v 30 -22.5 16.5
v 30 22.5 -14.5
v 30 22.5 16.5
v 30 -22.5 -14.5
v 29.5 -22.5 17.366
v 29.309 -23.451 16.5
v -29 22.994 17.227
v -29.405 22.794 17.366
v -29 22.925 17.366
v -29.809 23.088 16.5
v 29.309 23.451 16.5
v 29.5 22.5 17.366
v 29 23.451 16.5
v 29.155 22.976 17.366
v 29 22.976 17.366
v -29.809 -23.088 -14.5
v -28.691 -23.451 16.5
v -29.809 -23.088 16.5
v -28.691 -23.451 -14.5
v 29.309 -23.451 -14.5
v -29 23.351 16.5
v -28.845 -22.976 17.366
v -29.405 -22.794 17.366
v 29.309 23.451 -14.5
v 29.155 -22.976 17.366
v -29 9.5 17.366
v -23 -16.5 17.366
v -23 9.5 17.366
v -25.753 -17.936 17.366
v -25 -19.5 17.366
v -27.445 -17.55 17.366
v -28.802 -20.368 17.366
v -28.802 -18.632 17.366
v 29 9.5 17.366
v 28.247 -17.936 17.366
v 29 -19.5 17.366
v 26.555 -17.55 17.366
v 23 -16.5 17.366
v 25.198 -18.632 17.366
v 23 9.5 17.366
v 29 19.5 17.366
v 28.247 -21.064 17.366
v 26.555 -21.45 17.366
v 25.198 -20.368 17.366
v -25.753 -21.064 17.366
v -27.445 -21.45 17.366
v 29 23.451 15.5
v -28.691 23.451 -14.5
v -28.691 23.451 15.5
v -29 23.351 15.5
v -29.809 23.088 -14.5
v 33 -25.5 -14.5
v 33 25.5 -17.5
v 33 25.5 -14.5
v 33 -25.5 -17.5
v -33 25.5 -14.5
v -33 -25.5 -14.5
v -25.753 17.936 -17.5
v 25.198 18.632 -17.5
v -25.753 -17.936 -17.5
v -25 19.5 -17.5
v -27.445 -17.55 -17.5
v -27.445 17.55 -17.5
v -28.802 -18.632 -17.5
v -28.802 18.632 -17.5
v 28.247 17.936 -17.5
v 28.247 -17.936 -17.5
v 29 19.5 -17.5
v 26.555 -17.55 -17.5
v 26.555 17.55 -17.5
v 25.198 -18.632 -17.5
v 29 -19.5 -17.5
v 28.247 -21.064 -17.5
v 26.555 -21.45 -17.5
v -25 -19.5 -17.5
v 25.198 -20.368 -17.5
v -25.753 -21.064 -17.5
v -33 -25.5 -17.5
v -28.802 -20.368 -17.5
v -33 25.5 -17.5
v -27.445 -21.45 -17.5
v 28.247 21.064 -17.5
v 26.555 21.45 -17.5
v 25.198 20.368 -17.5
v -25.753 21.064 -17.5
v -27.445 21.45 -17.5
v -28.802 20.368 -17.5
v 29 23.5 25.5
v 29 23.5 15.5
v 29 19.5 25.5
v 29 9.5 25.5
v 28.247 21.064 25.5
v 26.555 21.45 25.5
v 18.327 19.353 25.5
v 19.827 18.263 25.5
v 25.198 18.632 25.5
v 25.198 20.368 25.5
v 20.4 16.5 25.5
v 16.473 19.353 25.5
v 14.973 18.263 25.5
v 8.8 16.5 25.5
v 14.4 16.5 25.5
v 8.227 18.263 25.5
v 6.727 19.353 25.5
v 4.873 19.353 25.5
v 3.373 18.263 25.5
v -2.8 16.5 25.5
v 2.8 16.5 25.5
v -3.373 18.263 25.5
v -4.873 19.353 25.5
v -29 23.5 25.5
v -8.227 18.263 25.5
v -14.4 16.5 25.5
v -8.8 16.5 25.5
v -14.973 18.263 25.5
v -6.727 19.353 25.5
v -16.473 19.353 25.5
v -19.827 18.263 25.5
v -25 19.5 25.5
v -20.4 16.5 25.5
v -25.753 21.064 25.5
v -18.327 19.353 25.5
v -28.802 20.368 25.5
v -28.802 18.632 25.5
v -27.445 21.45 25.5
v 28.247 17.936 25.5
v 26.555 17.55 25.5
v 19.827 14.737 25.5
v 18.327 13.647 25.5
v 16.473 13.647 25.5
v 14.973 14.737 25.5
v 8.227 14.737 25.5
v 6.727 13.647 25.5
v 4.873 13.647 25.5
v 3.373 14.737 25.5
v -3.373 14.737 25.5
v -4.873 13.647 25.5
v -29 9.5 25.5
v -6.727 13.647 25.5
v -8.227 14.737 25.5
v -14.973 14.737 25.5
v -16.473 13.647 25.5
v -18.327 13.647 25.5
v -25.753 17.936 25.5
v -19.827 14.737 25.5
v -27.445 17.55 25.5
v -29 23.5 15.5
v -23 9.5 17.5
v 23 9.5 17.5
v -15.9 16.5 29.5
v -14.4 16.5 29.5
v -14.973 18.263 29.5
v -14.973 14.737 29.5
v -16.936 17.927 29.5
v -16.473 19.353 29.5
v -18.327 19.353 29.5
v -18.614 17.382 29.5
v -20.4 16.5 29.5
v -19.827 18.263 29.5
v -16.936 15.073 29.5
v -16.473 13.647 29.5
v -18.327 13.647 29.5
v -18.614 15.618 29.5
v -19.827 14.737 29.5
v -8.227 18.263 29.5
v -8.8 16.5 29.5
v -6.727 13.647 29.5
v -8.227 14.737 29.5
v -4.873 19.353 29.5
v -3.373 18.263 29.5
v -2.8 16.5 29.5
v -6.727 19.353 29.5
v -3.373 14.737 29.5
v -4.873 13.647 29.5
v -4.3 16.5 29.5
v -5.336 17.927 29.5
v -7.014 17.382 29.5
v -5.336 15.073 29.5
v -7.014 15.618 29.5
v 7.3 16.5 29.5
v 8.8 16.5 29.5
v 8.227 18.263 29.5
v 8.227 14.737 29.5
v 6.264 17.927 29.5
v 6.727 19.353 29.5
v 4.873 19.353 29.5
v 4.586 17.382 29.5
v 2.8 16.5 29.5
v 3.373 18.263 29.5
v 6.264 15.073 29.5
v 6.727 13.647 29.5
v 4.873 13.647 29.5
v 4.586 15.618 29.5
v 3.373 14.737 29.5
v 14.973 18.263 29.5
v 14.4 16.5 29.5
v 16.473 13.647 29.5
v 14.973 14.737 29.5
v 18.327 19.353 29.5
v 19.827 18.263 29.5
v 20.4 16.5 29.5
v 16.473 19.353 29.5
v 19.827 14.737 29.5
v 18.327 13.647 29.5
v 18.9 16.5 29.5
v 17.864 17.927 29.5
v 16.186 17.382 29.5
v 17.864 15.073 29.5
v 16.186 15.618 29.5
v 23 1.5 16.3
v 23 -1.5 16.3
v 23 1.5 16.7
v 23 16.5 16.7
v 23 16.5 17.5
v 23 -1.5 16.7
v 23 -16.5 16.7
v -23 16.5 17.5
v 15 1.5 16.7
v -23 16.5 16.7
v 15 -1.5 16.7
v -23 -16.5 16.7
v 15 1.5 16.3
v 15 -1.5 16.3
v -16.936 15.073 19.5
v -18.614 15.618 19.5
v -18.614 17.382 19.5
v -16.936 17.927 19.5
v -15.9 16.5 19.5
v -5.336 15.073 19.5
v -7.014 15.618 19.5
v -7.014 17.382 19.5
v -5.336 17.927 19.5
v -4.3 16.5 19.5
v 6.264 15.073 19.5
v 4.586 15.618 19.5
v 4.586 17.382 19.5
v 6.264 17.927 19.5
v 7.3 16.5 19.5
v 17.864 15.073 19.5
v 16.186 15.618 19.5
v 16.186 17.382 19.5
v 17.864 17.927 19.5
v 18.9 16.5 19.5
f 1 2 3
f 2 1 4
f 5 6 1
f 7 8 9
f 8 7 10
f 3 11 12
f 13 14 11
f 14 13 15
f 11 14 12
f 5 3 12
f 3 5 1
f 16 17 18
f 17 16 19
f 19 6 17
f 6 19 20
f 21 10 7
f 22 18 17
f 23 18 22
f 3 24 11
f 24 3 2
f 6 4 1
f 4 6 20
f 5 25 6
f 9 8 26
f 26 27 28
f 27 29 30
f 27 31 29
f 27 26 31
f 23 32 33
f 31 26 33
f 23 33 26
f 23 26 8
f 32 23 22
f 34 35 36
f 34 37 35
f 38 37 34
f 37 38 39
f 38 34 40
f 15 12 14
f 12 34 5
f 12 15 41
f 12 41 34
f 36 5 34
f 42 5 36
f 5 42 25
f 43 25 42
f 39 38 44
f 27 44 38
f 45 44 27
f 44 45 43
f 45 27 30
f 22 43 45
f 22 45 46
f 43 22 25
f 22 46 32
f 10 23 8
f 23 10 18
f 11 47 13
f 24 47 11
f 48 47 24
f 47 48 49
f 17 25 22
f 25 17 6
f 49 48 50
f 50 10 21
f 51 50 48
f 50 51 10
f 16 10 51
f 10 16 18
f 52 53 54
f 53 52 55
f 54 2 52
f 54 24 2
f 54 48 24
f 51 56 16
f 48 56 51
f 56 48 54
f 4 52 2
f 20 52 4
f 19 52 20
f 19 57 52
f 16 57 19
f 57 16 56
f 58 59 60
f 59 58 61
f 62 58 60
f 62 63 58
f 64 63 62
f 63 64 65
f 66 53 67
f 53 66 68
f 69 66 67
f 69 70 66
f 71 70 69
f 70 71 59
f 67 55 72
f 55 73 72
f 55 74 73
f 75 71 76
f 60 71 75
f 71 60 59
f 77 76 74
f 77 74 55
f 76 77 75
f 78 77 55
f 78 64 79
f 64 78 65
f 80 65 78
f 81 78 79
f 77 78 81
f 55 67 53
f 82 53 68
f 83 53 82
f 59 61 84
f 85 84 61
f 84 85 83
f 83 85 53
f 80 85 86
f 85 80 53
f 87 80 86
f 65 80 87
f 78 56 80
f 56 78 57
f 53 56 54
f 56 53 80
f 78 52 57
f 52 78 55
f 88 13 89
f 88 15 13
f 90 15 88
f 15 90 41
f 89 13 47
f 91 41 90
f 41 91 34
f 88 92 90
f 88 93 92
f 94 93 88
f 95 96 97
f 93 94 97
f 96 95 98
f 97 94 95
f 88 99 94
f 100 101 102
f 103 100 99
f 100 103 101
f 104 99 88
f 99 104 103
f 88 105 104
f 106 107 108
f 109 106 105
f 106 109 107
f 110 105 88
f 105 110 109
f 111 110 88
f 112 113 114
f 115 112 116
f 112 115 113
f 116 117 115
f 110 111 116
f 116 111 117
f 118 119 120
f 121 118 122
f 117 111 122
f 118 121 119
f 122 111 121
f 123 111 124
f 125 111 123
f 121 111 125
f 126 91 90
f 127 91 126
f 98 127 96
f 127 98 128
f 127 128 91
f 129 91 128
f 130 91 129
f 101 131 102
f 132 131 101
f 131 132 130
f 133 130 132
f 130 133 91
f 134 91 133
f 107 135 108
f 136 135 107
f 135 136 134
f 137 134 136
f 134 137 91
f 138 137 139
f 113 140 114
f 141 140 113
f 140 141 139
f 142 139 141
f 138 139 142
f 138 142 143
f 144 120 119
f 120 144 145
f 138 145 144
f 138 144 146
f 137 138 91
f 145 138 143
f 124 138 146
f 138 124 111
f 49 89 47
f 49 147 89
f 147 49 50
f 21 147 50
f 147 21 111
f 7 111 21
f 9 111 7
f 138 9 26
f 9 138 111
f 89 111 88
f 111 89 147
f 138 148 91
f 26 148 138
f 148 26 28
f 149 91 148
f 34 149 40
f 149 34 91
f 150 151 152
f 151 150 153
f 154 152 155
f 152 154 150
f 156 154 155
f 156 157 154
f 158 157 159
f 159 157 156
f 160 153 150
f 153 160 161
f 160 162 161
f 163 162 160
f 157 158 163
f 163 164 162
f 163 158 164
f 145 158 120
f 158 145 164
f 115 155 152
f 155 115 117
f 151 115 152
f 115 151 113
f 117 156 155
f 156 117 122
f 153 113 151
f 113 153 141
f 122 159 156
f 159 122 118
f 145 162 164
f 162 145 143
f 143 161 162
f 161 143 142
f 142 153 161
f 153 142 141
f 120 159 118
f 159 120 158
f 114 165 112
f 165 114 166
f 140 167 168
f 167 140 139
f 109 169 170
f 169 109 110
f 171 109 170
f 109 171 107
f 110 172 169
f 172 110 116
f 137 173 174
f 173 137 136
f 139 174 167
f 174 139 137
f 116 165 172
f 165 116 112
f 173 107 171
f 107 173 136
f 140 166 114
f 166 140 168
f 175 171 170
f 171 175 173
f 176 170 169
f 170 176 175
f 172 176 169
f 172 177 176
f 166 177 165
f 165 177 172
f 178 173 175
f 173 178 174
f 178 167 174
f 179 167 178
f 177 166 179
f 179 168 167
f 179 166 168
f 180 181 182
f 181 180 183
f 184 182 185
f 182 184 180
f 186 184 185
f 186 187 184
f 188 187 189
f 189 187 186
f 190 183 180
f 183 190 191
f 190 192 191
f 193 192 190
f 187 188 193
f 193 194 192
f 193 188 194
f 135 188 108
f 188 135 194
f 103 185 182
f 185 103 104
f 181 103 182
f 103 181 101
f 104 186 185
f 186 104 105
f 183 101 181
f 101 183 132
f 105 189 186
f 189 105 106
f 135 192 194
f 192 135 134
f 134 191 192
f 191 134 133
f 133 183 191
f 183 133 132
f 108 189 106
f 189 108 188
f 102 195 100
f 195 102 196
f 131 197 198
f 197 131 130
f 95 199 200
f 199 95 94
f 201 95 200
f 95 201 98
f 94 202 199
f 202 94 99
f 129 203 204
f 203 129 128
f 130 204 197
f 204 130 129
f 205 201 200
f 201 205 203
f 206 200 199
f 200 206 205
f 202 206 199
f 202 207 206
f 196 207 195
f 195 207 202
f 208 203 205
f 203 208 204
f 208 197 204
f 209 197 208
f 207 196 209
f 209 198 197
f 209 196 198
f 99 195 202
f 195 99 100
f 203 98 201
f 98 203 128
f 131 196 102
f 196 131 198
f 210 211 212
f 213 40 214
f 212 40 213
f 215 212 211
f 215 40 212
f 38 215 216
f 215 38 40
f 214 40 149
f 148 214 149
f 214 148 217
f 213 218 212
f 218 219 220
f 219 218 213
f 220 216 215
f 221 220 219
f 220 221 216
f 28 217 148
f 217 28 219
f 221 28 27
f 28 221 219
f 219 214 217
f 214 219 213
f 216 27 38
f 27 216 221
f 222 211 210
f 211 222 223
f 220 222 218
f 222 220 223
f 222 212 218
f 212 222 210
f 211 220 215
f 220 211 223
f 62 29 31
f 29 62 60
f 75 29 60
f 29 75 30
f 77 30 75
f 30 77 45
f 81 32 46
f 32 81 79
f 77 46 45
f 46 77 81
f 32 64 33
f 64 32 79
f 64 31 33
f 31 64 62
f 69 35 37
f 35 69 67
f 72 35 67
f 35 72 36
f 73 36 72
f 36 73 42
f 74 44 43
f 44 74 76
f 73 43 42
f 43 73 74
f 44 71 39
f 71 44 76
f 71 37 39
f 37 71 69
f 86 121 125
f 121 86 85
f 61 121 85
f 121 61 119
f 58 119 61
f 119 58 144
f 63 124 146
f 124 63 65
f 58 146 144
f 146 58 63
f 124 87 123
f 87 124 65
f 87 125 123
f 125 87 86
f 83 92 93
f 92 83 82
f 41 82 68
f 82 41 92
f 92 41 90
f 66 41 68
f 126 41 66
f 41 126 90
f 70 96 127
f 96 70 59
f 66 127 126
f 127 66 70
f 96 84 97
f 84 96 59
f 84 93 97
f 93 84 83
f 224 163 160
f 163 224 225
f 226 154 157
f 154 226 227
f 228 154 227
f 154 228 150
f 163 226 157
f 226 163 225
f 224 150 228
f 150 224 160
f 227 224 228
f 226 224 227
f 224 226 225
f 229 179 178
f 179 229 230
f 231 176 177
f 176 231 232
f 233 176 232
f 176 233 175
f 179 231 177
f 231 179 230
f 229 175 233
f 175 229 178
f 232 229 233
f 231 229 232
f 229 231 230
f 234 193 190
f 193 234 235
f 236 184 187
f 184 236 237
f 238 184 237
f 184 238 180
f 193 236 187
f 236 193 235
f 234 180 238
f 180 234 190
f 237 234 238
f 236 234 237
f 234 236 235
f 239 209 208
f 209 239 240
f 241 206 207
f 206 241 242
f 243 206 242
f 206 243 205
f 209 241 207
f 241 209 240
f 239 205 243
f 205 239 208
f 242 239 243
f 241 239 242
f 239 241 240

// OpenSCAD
// Parameters
body_L = 58.0; //[29.0:116.0:0.5]
body_W = 45.0; //[22.5:90.0:0.5]
body_H = 33.0; //[16.5:66.0:0.5]
hole_d = 4.0; //[2.0:8.0:0.25]
hole_edge_offset_L = 6.0; //[3.0:12.0:0.5]
hole_edge_offset_W = 6.0; //[3.0:12.0:0.5]
terminal_L = 58.0; //[29.0:116.0:0.5]
terminal_W = 14.0; //[7.0:28.0:0.5]
terminal_H = 10.0; //[5.0:20.0:0.5]
flange_thk = 3.0; //[1.5:6.0:0.25]
flange_overhang_L = 4.0; //[2.0:8.0:0.5]
flange_overhang_W = 3.0; //[1.5:6.0:0.5]
label_recess_depth = 0.8; //[0.4:2.0:0.1]
label_margin_L = 6.0; //[3.0:12.0:0.5]
label_margin_W = 6.0; //[3.0:12.0:0.5]
led_win_L = 8.0; //[4.0:16.0:0.5]
led_win_W = 3.0; //[1.5:8.0:0.25]
led_win_depth = 1.2; //[0.6:3.0:0.1]
screw_boss_d = 6.0; //[3.0:12.0:0.25]
screw_boss_h = 4.0; //[2.0:10.0:0.25]
screw_hole_d = 3.0; //[1.5:6.0:0.25]
screw_count = 4.0; //[2.0:6.0:1.0]
edge_chamfer = 1.0; //[0.5:3.0:0.25]
connect_overlap = 1.0; //[0.5:2.0:0.25]

// Main Body with Chamfer
module main_body_chamfered() {
  minkowski() {
    translate([0, 0, 0])
      cube([body_L, body_W, body_H], center=true);
    sphere(r=edge_chamfer, center=true);
  }
}

// Base Flange
module base_flange() {
  translate([0, 0, -body_H/2 + flange_thk/2 - connect_overlap])
    cube([body_L + 2*flange_overhang_L, body_W + 2*flange_overhang_W, flange_thk], center=true);
}

// Terminal Block
module terminal_block_top() {
  translate([0, body_W/2 - terminal_W/2 + connect_overlap, body_H/2 + terminal_H/2 - connect_overlap])
    cube([terminal_L, terminal_W, terminal_H], center=true);
}

// Screw Boss
module screw_boss(x_offset) {
  translate([x_offset, body_W/2 - terminal_W/2 + connect_overlap, body_H/2 + terminal_H - connect_overlap + screw_boss_h/2])
    cylinder(r=screw_boss_d/2, h=screw_boss_h, center=true);
}

// Screw Hole
module screw_hole(x_offset) {
  translate([x_offset, body_W/2 - terminal_W/2 + connect_overlap, body_H/2 + terminal_H - connect_overlap + screw_boss_h/2])
    cylinder(r=screw_hole_d/2, h=screw_boss_h + terminal_H + 2*connect_overlap, center=true);
}

// Mounting Hole
module mount_hole(x_offset, y_offset) {
  translate([x_offset, y_offset, 0])
    cylinder(r=hole_d/2, h=flange_thk + body_H + 2*terminal_H, center=true);
}

// Label Recess
module label_recess_cut() {
  translate([0, 0, body_H/2 - label_recess_depth/2 + connect_overlap])
    cube([body_L - 2*label_margin_L, body_W - 2*label_margin_W, label_recess_depth], center=true);
}

// LED Window
module indicator_led_window_cut() {
  translate([body_L/2 - label_margin_L - led_win_L/2, 0, body_H/2 - led_win_depth/2 + connect_overlap])
    cube([led_win_L, led_win_W, led_win_depth], center=true);
}

// SSR Complete Model
module ssr_complete_model() {
  difference() {
    union() {
      main_body_chamfered();
      base_flange();
      terminal_block_top();
      screw_boss(-terminal_L/2 + terminal_L/5);
      screw_boss(-terminal_L/2 + 2*terminal_L/5);
      screw_boss(-terminal_L/2 + 3*terminal_L/5);
      screw_boss(-terminal_L/2 + 4*terminal_L/5);
    }
    union() {
      label_recess_cut();
      indicator_led_window_cut();
      mount_hole((-body_L/2 - flange_overhang_L) + hole_edge_offset_L, (-body_W/2 - flange_overhang_W) + hole_edge_offset_W);
      mount_hole((body_L/2 + flange_overhang_L) - hole_edge_offset_L, (-body_W/2 - flange_overhang_W) + hole_edge_offset_W);
      mount_hole((-body_L/2 - flange_overhang_L) + hole_edge_offset_L, (body_W/2 + flange_overhang_W) - hole_edge_offset_W);
      mount_hole((body_L/2 + flange_overhang_L) - hole_edge_offset_L, (body_W/2 + flange_overhang_W) - hole_edge_offset_W);
      screw_hole(-terminal_L/2 + terminal_L/5);
      screw_hole(-terminal_L/2 + 2*terminal_L/5);
      screw_hole(-terminal_L/2 + 3*terminal_L/5);
      screw_hole(-terminal_L/2 + 4*terminal_L/5);
    }
  }
}

// Render the SSR Model
color([0.85, 0.85, 0.8]) // Off-white for 3D printed PLA
ssr_complete_model();
